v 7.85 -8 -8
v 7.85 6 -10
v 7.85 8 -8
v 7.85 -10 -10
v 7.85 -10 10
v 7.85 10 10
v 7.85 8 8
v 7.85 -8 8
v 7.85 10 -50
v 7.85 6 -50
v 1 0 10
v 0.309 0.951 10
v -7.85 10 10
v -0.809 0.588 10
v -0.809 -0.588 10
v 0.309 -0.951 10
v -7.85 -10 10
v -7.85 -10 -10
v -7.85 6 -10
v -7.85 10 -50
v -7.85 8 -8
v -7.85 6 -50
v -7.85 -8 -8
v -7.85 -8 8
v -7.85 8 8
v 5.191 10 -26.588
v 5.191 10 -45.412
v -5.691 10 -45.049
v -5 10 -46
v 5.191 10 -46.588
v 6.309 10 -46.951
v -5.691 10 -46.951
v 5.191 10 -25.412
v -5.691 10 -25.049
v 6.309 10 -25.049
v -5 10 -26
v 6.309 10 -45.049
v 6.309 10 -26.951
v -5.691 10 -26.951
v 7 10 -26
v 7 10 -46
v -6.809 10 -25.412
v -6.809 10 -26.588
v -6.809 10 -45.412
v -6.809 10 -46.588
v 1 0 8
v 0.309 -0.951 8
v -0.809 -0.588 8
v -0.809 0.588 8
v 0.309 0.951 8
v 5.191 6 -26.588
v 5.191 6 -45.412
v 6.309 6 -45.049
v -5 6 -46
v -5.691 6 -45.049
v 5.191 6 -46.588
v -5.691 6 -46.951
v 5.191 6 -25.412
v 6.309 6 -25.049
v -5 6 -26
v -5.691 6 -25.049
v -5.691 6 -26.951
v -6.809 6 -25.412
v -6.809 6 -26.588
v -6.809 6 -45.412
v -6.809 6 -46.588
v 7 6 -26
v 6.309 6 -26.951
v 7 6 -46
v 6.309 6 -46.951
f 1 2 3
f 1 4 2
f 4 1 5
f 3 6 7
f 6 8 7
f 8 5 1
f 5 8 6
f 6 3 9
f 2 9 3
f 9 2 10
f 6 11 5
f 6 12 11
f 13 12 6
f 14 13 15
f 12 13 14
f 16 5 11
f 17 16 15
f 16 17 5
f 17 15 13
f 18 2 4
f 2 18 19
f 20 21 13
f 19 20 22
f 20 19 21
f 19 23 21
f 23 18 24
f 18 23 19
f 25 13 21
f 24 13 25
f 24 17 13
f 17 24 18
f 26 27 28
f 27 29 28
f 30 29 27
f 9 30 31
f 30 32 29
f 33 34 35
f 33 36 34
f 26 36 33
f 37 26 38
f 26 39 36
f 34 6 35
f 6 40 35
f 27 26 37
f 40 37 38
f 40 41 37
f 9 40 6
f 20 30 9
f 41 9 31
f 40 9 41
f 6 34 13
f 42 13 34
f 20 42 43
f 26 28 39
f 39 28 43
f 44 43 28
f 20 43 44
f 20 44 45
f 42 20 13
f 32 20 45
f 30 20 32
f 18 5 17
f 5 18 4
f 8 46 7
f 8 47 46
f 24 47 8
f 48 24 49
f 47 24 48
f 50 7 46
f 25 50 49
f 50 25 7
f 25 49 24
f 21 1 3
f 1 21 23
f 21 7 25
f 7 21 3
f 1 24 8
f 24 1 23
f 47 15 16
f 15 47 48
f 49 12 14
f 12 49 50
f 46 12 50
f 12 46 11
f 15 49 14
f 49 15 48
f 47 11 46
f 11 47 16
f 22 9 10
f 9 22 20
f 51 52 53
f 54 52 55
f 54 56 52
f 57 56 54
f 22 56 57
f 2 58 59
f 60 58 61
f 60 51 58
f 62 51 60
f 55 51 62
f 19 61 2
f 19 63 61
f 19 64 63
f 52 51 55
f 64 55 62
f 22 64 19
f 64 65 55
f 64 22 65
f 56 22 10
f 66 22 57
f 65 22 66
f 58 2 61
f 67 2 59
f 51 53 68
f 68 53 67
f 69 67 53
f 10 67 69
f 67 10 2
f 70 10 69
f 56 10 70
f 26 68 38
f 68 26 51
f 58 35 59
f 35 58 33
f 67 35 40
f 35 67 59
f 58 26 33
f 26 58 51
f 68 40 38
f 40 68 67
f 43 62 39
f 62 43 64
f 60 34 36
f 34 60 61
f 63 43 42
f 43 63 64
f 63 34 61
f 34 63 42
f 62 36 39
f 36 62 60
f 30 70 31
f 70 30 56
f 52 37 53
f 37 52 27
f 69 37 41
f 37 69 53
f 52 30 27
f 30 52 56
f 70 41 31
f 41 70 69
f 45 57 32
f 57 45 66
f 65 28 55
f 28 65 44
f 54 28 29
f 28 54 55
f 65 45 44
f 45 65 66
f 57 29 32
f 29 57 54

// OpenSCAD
$BAR=[15.70,16,16];
$DISTANCE=10;
$WALL=2;
$DRILLHOLE=1;
$SCREWHEAD=3;
$MOTOR=[28.57, 24.5 + $SCREWHEAD, 42.7];
$MOTORFRONT=10;

//CONNECTING DRILLHOLES
module drillholes(){
    $DRILLHOLE_OFFSET=[$BAR[1]/4 + $WALL,($BAR[1]/2), -($DISTANCE + $BAR[2])];

    translate([$DRILLHOLE_OFFSET[0],$DRILLHOLE_OFFSET[1],$DRILLHOLE_OFFSET[2]]){
        rotate([90,0,0]){
            cylinder(4*$WALL,$DRILLHOLE,$DRILLHOLE, center=true);
        }
    }

    translate([-$DRILLHOLE_OFFSET[0],$DRILLHOLE_OFFSET[1],$DRILLHOLE_OFFSET[2]]){
        rotate([90,0,0]){
            cylinder(4*$WALL,$DRILLHOLE,$DRILLHOLE, center=true);
        }
    }

    translate([$DRILLHOLE_OFFSET[0],$DRILLHOLE_OFFSET[1],$DRILLHOLE_OFFSET[2]-2*$DISTANCE]){
        rotate([90,0,0]){
            cylinder(4*$WALL,$DRILLHOLE,$DRILLHOLE, center=true);
        }
    }

    translate([-$DRILLHOLE_OFFSET[0],$DRILLHOLE_OFFSET[1],$DRILLHOLE_OFFSET[2]-2*$DISTANCE]){
        rotate([90,0,0]){
            cylinder(4*$WALL,$DRILLHOLE,$DRILLHOLE, center=true);
        }
    }
}

module barconnector(){
    //BARCONNECTOR
    difference(){
        cube($BAR + [0,2*$WALL,2*$WALL], center=true);
        cube($BAR, center=true);
        translate([0,0,$BAR[2]/2+$WALL/2]){
            cylinder($WALL,$DRILLHOLE,$DRILLHOLE, center=true);
        }
    }
    //DISTANCEBLOCK
    translate([0,$BAR[1]/2,-($BAR[2]/2 + $WALL + 2*$DISTANCE)]){
        cube([$BAR[0], 2*$WALL, 4*$DISTANCE], center=true);
    }
}




//MOTORBLOCK
module motorblock(){
    translate([0, ($BAR[1]/2 + $MOTOR[1]/2 + 2*$WALL), -($BAR[2]/2 + $MOTOR[2]/2 + $WALL + $DISTANCE)]){
        difference(){
            translate([0,0,-$WALL]){
                cube($MOTOR + [2*$WALL,2*$WALL,2*$WALL], center=true);
            }
            cube($MOTOR, center=true);
            translate([0,0,-($MOTOR[2]/2 + 2*$WALL)]){
                #cylinder(2*$WALL, $MOTORFRONT/2, $MOTORFRONT/2);
            }
        }
    }
}

difference(){
    barconnector();
    drillholes();
}

/*difference(){
    motorblock();
    translate([0,$WALL,0]) drillholes();
}*/

/*difference(){
    cylinder(20,5.65/2,5.6/2);
    cylinder(20,2.4/2,2.4/2);
}*/
